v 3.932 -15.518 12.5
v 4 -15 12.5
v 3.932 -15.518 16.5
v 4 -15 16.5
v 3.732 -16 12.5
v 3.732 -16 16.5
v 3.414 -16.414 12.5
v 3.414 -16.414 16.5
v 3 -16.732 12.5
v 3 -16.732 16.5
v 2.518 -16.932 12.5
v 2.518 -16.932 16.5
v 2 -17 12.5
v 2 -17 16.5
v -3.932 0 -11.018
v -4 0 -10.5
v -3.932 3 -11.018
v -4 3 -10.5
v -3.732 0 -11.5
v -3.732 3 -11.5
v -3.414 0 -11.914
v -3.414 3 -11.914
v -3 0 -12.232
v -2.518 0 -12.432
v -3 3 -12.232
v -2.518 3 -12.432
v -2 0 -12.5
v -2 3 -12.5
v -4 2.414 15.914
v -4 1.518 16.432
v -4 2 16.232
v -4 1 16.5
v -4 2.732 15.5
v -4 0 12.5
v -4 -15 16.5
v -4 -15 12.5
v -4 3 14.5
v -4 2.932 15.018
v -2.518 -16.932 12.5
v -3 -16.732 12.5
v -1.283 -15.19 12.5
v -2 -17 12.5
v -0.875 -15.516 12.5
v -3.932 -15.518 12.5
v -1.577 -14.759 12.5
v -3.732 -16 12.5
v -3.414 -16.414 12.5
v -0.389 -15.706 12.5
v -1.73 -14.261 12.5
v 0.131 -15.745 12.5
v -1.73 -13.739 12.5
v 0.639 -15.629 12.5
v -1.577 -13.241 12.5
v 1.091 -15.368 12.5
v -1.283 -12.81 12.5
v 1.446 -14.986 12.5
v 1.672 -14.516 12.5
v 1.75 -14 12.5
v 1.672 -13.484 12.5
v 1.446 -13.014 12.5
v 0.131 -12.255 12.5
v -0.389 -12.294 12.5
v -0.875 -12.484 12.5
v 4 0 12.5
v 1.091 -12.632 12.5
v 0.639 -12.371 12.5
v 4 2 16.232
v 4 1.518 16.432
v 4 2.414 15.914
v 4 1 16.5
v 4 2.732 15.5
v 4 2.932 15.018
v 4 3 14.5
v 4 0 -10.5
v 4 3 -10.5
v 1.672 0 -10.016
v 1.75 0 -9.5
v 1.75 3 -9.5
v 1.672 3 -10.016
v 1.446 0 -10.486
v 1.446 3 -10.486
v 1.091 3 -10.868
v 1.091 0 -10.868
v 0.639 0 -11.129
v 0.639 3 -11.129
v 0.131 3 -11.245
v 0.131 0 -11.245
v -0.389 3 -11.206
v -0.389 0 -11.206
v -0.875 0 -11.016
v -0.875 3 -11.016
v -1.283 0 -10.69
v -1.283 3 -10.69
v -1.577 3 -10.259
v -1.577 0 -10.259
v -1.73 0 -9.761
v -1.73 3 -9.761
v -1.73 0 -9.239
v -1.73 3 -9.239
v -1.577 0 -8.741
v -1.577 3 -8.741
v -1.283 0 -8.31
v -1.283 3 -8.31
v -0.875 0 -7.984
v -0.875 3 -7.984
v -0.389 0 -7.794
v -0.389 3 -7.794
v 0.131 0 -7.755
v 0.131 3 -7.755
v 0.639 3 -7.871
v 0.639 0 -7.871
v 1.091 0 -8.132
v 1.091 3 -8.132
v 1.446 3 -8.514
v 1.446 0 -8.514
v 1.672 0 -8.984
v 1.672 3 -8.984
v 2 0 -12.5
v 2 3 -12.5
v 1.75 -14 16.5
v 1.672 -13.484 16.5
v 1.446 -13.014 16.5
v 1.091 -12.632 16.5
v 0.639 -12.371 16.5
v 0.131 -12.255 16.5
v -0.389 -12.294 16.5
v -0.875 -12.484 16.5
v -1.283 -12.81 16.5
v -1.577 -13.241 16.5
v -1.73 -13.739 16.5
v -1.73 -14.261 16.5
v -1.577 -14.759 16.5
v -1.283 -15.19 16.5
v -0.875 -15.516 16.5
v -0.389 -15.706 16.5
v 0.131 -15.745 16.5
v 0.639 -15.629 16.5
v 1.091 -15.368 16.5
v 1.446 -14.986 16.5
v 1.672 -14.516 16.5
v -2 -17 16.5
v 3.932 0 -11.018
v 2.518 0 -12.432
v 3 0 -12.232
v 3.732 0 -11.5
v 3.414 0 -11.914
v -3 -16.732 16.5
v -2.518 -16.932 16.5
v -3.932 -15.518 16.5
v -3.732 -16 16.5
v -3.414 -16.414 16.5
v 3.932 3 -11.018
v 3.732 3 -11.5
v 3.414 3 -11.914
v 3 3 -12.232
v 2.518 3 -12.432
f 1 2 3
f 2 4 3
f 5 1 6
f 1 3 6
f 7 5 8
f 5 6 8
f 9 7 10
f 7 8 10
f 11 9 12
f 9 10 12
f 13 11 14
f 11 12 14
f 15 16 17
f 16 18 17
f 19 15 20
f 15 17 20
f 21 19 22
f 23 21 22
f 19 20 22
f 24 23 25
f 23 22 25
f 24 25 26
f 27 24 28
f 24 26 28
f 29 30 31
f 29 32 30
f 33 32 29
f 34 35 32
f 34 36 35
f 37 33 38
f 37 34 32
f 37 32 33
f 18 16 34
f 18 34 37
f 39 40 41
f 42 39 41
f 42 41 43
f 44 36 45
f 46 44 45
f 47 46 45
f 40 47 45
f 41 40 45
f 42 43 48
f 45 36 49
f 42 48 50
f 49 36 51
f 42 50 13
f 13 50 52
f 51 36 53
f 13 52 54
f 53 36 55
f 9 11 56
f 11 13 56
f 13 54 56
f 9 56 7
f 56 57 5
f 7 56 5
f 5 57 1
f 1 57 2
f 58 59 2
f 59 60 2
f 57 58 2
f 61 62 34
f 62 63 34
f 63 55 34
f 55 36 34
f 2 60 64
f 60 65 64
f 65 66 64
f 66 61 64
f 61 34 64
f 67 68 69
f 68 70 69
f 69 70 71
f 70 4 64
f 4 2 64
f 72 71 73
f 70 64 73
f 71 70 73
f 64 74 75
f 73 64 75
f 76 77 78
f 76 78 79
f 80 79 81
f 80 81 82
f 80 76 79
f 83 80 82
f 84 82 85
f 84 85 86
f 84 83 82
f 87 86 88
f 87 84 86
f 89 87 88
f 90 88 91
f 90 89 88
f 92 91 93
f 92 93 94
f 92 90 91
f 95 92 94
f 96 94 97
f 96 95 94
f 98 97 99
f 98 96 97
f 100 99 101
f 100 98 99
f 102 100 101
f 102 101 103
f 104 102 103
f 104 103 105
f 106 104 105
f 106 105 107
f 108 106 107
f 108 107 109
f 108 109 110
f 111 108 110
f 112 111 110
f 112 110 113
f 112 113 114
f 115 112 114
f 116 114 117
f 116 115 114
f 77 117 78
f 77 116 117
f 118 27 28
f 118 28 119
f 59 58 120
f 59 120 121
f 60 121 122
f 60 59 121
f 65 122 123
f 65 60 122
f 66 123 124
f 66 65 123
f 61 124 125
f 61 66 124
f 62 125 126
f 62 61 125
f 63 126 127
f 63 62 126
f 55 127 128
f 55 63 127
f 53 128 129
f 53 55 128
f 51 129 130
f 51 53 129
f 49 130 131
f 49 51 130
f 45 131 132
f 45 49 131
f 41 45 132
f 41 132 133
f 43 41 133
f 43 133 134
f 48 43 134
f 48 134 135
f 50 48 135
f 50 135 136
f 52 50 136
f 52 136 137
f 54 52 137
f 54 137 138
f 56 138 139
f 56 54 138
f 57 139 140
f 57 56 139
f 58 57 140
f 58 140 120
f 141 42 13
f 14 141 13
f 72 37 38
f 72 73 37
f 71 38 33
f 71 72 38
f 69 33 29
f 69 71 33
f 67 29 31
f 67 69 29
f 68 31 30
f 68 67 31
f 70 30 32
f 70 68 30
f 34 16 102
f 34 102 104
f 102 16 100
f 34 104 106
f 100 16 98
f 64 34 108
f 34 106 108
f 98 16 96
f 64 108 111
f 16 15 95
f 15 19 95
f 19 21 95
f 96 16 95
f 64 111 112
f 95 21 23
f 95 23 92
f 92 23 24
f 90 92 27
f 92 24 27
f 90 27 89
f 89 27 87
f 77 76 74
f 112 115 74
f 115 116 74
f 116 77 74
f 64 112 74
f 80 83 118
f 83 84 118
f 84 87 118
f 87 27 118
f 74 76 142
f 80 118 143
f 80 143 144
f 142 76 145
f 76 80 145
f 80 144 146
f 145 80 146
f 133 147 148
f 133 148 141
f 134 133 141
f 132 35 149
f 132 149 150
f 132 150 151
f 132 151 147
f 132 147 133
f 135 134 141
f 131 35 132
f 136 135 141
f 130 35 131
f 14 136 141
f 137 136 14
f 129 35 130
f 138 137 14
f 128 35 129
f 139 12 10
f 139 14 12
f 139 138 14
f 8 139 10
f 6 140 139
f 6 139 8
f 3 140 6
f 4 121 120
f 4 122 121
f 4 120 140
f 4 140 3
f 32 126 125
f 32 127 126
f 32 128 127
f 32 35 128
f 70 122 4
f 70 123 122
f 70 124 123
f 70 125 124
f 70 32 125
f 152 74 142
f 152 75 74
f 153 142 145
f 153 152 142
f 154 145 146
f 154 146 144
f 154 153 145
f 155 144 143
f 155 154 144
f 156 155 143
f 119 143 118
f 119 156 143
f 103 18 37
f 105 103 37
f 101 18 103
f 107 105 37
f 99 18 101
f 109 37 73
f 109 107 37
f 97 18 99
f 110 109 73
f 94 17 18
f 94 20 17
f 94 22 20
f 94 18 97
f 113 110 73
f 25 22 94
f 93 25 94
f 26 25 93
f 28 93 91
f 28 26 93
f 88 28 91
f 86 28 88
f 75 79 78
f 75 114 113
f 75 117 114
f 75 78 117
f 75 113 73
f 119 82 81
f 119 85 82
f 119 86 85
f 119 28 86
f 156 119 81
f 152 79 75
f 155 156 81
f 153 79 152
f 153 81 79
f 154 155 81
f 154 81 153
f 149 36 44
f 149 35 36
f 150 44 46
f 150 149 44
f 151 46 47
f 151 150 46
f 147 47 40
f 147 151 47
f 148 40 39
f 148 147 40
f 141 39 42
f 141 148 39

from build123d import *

# Parameters (mm, degrees)
ESQUISSE1_W        = 8
ESQUISSE1_H        = 25
ESQUISSE1_R        = 1.75
BOSS_EXTRU_1_DEPTH = 3
ESQUISSE2_W        = 8
ESQUISSE2_H        = 20
ESQUISSE2_R        = 1.75
BOSS_EXTRU_2_DEPTH = 4
CONG_1_R           = 2


with BuildPart() as part:
    # Esquisse1 → Boss.-Extru.1 (new body)
    with BuildSketch(Plane(origin=(0, 0, 0), x_dir=(1, 0, 0), z_dir=(0, 1, 0))):
        Rectangle(ESQUISSE1_W, ESQUISSE1_H)
        with Locations((0, 9.5)):
            Circle(ESQUISSE1_R, mode=Mode.SUBTRACT)
    extrude(amount=BOSS_EXTRU_1_DEPTH)

    # Esquisse2 → Boss.-Extru.2 (add)
    with BuildSketch(Plane.XY.offset(12.5)):
        with Locations((0, -7)):
            Rectangle(ESQUISSE2_W, ESQUISSE2_H)
        with Locations((0, -14)):
            Circle(ESQUISSE2_R, mode=Mode.SUBTRACT)
    extrude(amount=BOSS_EXTRU_2_DEPTH)

    # Congé1
    cong_1_edges = [part.edges().sort_by_distance(p)[0] for p in [
        (0, 3, 16.5),
        (-4, -17, 14.5),
        (4, -17, 14.5),
        (-4, 1.5, -12.5),
        (4, 1.5, -12.5),
    ]]
    fillet(cong_1_edges, radius=CONG_1_R)


solid = part.part
